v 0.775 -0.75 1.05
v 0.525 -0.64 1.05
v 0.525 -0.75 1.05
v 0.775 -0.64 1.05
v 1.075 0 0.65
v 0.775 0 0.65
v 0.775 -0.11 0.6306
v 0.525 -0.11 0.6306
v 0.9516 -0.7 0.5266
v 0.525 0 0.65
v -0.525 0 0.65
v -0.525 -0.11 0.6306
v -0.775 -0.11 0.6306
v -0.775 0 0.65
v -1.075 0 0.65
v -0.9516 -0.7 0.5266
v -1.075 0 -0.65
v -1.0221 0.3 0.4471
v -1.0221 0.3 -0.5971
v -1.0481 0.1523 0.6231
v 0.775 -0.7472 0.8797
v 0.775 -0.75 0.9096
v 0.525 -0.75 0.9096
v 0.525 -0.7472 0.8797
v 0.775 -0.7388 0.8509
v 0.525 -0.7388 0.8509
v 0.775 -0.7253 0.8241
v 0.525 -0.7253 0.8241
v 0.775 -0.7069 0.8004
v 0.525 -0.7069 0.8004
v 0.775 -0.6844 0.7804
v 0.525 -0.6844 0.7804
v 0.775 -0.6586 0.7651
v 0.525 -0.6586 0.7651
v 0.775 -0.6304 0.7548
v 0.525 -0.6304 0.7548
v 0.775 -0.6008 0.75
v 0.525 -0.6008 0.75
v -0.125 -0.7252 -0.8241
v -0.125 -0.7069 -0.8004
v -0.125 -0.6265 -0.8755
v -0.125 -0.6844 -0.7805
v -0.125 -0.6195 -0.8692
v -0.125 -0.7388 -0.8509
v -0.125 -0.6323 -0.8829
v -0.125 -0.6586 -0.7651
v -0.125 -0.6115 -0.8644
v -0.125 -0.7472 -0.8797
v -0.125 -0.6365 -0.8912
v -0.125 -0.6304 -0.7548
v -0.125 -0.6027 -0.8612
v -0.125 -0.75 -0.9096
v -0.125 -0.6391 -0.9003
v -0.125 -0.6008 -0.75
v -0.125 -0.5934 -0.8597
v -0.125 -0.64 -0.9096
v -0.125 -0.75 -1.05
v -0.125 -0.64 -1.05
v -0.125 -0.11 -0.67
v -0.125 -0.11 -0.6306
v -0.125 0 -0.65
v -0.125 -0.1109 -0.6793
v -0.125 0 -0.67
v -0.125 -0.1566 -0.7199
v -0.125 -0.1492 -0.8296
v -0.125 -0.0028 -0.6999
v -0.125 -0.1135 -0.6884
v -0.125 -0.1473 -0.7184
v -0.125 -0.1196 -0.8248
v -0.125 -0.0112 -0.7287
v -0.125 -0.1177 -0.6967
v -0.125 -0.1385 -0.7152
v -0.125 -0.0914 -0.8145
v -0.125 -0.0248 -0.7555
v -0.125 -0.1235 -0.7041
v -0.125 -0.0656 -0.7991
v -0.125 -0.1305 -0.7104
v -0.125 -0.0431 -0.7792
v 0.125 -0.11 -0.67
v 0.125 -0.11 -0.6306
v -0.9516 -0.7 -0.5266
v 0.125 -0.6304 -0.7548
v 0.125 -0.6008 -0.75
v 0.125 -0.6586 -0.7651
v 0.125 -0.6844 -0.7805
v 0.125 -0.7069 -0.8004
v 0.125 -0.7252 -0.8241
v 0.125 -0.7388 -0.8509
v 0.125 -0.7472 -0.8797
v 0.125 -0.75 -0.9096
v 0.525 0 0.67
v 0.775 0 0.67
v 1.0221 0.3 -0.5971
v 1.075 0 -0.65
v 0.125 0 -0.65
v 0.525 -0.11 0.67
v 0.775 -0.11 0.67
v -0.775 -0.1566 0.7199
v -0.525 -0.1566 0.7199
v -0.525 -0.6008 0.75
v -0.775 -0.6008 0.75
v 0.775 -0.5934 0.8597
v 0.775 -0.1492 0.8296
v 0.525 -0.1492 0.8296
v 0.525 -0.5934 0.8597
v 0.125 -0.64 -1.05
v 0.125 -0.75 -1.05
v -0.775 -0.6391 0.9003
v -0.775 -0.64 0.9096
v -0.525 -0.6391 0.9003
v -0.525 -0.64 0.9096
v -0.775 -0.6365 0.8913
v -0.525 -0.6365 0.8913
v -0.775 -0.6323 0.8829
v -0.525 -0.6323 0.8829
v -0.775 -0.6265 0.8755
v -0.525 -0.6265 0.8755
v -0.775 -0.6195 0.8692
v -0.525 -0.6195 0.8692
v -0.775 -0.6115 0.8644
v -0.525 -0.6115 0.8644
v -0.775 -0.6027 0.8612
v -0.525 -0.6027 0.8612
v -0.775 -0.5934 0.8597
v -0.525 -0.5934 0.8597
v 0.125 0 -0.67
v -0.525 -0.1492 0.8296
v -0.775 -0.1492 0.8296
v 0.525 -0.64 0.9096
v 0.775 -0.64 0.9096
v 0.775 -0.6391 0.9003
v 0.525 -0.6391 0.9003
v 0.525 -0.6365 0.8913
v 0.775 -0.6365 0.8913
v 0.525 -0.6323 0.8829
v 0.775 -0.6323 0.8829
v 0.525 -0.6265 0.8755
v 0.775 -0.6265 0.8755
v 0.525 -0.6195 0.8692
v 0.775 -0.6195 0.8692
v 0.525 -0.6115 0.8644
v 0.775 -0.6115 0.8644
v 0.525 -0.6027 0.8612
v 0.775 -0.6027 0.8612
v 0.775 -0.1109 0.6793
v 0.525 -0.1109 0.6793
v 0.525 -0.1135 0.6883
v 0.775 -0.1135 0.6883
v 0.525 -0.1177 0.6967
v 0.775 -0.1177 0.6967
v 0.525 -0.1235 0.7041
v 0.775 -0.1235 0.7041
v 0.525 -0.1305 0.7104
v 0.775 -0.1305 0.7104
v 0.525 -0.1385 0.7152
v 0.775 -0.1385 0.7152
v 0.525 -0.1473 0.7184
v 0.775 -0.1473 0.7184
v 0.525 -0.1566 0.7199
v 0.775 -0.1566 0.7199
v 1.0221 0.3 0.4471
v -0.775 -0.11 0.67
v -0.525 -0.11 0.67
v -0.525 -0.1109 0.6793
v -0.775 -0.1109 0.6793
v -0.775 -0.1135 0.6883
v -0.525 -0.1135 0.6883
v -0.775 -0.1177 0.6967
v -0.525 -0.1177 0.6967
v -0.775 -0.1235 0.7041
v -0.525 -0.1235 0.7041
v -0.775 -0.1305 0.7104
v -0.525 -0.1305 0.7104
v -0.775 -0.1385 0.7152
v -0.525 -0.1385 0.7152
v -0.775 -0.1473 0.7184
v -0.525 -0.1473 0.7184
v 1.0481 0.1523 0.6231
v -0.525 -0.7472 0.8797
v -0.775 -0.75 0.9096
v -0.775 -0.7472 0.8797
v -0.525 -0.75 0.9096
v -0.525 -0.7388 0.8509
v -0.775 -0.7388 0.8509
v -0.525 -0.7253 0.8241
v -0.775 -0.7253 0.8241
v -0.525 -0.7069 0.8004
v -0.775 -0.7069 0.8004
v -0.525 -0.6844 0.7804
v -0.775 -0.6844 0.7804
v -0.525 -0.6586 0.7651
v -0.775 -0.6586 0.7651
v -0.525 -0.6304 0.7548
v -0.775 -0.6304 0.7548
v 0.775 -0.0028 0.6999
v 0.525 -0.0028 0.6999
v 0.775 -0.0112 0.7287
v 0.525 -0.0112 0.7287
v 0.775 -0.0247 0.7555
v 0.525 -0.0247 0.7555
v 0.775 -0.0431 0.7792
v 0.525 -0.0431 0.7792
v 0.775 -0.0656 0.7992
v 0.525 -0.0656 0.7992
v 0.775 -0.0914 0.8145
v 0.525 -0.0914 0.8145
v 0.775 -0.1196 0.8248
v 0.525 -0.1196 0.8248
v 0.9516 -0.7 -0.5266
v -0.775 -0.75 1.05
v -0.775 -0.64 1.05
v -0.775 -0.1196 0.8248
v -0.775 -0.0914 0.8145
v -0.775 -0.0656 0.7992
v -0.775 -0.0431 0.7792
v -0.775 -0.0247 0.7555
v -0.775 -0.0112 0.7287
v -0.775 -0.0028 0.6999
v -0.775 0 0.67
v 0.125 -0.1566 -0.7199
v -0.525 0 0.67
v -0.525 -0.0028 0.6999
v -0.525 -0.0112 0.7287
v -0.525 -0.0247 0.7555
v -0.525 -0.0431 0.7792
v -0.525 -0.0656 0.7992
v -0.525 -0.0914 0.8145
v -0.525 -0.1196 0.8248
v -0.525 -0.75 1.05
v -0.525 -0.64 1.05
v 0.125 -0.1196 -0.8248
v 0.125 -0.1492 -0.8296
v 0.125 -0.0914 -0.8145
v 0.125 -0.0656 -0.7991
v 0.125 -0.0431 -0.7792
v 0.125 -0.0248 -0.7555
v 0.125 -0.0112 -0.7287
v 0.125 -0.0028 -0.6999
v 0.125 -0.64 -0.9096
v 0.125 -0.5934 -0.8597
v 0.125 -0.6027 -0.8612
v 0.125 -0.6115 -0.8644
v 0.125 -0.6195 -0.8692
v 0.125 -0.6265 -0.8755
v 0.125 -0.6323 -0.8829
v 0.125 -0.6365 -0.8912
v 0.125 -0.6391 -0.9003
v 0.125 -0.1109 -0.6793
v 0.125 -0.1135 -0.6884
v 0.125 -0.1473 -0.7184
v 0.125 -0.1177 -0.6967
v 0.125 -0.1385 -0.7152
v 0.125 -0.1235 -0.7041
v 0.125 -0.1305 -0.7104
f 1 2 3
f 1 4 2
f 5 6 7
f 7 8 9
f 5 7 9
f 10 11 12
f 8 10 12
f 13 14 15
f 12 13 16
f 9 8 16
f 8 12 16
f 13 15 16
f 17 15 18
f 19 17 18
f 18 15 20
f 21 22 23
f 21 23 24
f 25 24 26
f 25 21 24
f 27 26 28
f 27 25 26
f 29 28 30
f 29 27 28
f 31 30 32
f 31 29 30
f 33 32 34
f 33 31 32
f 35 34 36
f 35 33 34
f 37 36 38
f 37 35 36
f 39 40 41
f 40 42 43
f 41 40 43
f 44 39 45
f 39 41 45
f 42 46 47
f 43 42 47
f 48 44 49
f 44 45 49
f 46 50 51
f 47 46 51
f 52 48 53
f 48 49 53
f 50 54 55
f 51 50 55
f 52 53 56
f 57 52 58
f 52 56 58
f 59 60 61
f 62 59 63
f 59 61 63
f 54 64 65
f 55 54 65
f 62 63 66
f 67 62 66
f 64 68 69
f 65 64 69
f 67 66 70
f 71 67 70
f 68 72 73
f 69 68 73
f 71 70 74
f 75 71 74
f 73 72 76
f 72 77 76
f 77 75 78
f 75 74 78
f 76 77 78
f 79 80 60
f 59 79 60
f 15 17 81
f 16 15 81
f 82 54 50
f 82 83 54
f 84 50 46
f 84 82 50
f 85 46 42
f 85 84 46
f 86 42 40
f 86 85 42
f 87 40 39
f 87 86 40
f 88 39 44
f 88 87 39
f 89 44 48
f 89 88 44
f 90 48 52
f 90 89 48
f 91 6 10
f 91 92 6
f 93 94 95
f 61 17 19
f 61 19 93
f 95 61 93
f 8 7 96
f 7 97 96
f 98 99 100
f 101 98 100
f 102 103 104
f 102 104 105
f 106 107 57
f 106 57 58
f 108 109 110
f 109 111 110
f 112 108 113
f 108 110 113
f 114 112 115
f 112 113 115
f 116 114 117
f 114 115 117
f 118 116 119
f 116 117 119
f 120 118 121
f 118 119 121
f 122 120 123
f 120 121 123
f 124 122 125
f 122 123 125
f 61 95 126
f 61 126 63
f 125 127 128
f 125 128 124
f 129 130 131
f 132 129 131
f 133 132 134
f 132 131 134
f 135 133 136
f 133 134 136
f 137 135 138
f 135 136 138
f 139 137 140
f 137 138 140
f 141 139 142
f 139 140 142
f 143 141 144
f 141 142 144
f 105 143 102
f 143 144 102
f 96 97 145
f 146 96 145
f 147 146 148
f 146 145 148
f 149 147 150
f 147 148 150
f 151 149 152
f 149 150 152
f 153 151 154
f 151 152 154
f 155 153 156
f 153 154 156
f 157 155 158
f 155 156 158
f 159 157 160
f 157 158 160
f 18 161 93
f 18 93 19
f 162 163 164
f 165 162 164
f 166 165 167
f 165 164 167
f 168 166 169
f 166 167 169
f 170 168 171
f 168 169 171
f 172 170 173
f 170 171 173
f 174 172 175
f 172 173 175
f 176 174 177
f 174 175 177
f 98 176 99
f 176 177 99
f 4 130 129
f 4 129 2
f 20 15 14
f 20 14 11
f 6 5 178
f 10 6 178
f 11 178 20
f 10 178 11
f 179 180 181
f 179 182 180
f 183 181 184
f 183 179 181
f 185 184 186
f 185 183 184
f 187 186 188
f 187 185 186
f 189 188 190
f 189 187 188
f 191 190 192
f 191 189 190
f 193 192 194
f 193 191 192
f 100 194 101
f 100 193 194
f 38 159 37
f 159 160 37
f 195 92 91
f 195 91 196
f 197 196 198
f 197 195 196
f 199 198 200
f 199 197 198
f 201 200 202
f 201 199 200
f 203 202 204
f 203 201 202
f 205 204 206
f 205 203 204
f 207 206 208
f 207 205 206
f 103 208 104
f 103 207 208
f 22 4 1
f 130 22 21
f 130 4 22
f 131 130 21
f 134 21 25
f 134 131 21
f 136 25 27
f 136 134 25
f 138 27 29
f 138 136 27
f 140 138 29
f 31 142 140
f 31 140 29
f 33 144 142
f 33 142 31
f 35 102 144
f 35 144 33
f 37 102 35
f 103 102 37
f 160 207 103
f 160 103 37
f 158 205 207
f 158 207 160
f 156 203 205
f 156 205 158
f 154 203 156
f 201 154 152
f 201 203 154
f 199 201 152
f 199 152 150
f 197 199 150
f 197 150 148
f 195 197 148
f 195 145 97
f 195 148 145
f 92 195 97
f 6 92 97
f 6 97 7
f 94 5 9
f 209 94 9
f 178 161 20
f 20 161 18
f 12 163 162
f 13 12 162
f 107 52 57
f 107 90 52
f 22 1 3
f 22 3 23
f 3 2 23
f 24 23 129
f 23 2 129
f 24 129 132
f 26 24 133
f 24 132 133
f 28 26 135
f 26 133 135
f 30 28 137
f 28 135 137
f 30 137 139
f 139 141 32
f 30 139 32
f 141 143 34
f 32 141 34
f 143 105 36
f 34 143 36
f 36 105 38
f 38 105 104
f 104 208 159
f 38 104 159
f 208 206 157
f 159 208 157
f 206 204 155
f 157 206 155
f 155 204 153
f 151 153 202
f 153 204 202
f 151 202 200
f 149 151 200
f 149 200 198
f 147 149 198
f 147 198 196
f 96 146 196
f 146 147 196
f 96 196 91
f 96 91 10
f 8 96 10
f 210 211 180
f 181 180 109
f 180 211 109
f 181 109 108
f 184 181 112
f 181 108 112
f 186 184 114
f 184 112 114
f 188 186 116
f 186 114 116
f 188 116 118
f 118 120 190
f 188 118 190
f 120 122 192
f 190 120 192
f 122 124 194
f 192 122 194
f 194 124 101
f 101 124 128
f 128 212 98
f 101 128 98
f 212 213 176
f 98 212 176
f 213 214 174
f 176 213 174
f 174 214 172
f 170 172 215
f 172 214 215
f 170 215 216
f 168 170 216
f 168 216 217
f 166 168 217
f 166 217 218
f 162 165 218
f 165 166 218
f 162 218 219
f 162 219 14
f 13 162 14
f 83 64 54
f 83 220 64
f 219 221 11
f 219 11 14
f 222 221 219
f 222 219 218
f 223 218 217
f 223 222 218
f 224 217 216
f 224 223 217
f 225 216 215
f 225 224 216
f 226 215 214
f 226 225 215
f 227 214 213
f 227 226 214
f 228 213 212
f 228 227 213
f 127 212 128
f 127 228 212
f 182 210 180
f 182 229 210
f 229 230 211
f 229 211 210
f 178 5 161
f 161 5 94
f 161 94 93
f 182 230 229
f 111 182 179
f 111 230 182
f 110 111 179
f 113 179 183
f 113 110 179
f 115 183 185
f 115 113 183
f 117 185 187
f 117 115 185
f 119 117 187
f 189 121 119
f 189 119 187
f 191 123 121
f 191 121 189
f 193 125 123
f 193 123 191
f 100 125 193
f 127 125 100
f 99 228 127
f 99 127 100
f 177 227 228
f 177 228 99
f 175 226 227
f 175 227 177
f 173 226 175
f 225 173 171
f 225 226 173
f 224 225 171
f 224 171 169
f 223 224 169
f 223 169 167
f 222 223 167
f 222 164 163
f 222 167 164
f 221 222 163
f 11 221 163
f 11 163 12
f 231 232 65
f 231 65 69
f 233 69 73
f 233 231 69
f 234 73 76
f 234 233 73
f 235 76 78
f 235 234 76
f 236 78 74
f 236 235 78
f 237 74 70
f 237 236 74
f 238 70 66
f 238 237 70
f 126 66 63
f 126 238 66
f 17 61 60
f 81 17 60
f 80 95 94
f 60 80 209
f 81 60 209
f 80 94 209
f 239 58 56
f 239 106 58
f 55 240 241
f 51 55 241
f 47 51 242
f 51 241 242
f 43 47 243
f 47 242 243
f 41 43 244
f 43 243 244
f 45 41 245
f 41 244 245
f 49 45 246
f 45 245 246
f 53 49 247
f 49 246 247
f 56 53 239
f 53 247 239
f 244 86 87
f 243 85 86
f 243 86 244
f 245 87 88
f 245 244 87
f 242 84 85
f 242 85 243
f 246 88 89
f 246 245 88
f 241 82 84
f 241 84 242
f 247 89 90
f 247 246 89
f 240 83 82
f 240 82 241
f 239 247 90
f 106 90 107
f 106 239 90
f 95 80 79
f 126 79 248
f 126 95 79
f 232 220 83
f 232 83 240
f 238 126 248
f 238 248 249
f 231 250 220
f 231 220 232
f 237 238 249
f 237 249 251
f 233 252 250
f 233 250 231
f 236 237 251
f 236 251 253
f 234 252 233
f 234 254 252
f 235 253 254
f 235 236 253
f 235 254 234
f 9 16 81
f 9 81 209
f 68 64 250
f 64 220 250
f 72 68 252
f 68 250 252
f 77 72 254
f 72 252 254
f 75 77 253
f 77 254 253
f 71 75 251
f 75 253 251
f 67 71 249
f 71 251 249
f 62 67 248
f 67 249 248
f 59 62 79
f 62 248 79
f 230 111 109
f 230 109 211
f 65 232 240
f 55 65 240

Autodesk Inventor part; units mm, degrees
ref_plane "YZ Plane" through (0, 0, 0) normal (1, 0, 0) x (0, 1, 0)
ref_plane "XZ Plane" through (0, 0, 0) normal (0, 1, 0) x (-1, 0, 0)
ref_plane "XY Plane" through (0, 0, 0) normal (0, 0, 1) x (1, 0, 0)
sketch "Sketch1" plane through (0, 0, 0) normal (0, 1, 0) x (-1, 0, 0)
  line L0 (-1.075, 0.65) -> (1.075, 0.65)
  line L1 (1.075, 0.65) -> (1.075, -0.65)
  line L2 (1.075, -0.65) -> (-1.075, -0.65)
  line L3 (-1.075, -0.65) -> (-1.075, 0.65)
  line L4 (-1.075, 0.65) -> (1.075, -0.65) construction
  line L5 (1.075, 0.65) -> (-1.075, -0.65) construction
  point P0 (0, 0)
  dimension "d0" = 2.15
  dimension "d1" = 1.3
extrude "Extrusion1" add sketch "Sketch1" along normal blind 0.3 draft -10
sketch "Sketch2" plane through (0, 0, 0) normal (0, -1, 0) x (1, 0, 0)
  line L0 (1.075, 0.65) -> (-1.075, 0.65) projected
  line L1 (-1.075, 0.65) -> (-1.075, -0.65) projected
  line L2 (-1.075, -0.65) -> (1.075, -0.65) projected
  line L3 (1.075, -0.65) -> (1.075, 0.65) projected
  point P0 (0, 0)
extrude "Extrusion2" add sketch "Sketch2" along normal blind 0.7 draft -10
sketch "Sketch3" plane through (0, 0, 0) normal (0, 1, 0) x (-1, 0, 0)
  line L0 (-1.075, 0.65) -> (1.075, 0.65) projected
  line L1 (1.075, 0.65) -> (1.075, -0.65) projected
  line L2 (1.075, -0.65) -> (-1.075, -0.65) projected
  line L3 (-1.075, -0.65) -> (-1.075, 0.65) projected
  line L4 (-0.775, 0.65) -> (-0.525, 0.65)
  line L5 (-0.525, 0.65) -> (-0.525, 0.67)
  line L6 (-0.525, 0.67) -> (-0.775, 0.67)
  line L7 (-0.775, 0.67) -> (-0.775, 0.65)
  line L8 (-0.125, -0.65) -> (0.125, -0.65)
  line L9 (0.125, -0.65) -> (0.125, -0.67)
  line L10 (0.125, -0.67) -> (-0.125, -0.67)
  line L11 (-0.125, -0.67) -> (-0.125, -0.65)
  line L12 (-0.525, 0.65) -> (-0.775, 0.65)
  line L13 (-0.775, 0.65) -> (-0.775, 0)
  line L14 (-0.775, 0) -> (-0.525, 0)
  line L15 (-0.525, 0) -> (-0.525, 0.65)
  line L16 (-0.125, -0.65) -> (0.125, -0.65)
  line L17 (0.125, -0.65) -> (0.125, 0)
  line L18 (0.125, 0) -> (-0.125, 0)
  line L19 (-0.125, 0) -> (-0.125, -0.65)
  point P0 (0, 0)
  point P1 (0, -0.67)
  point P2 (-0.65, 0.67)
  point P3 (0, 0)
  dimension "d6" = 0.25
  dimension "d7" = 0.02
  dimension "d8" = 0.65
  dimension "d9" = 0
extrude "Extrusion3" add sketch "Sketch3" against normal blind 0.11 contours L7 L6 L5 L0 | L0 L15 L14 L13
sketch "Sketch4" plane through (0.775, 0, 0.67) normal (1, 0, 0) x (0, 0, -1)
  line L0 (0.02, 0) -> (0.0394, -0.11) projected
  line L1 (0, 0) -> (0.02, 0) projected
  line L2 (0, 0) -> (0, -0.11) projected
  line L3 (0.0394, -0.11) -> (0, -0.11) projected
  line L4 (0, -0.11) -> (0.0394, -0.11) projected
  arc A0 (0, -0.11) -> (-0.0499, -0.1566) centre (0, -0.16) ccw
  arc A1 (0, 0) -> (-0.1596, -0.1492) centre (0, -0.16) ccw
  arc A2 (-0.2396, -0.64) -> (-0.1897, -0.5934) centre (-0.2396, -0.59) ccw
  arc A3 (-0.2396, -0.75) -> (-0.08, -0.6008) centre (-0.2396, -0.59) ccw
  line L5 (-0.0499, -0.1566) -> (-0.08, -0.6008)
  line L6 (-0.1596, -0.1492) -> (-0.1897, -0.5934)
  line L7 (-0.2396, -0.64) -> (-0.38, -0.64)
  line L8 (-0.38, -0.64) -> (-0.38, -0.75)
  line L9 (-0.38, -0.75) -> (-0.2396, -0.75)
  line L10 (0.0394, -0.11) -> (0, -0.11) projected
  line L11 (0, 0) -> (0.02, 0) projected
  line L12 (0, 0) -> (0, -0.11) projected
  line L13 (1.1966, -0.7) -> (0.1434, -0.7) projected
  point P0 (0.67, 0)
  dimension "d12" = 1.05
  dimension "d13" = 0.05
  dimension "d14" = 0.05
  dimension "d15" = 0.3
extrude "Extrusion4" add sketch "Sketch4" against normal up to surface (0.25 mm away) contours L2 A0 L5 A3 L9 L8 L7 A2 L6 A1
extrude "Extrusion5" add sketch "Sketch3" against normal blind 0.11 contours L19 L18 L17 L2 | L2 L9 L10 L11
sketch "Sketch5" plane through (0.125, 0, -0.65) normal (1, 0, 0) x (0, 0, -1)
  line L0 (-1.3, 0) -> (-1.2806, -0.11) projected
  line L1 (-1.32, 0) -> (-1.3, 0) projected
  arc A0 (-1.32, 0) -> (-1.4796, -0.1492) centre (-1.32, -0.16) ccw projected
  line L2 (-1.4796, -0.1492) -> (-1.5097, -0.5934) projected
  arc A1 (-1.5596, -0.64) -> (-1.5097, -0.5934) centre (-1.5596, -0.59) ccw projected
  line L3 (-1.5596, -0.64) -> (-1.7, -0.64) projected
  line L4 (-1.7, -0.64) -> (-1.7, -0.75) projected
  line L5 (-1.7, -0.75) -> (-1.5596, -0.75) projected
  arc A2 (-1.5596, -0.75) -> (-1.4, -0.6008) centre (-1.5596, -0.59) ccw projected
  line L6 (-1.4, -0.6008) -> (-1.3699, -0.1566) projected
  arc A3 (-1.32, -0.11) -> (-1.3699, -0.1566) centre (-1.32, -0.16) ccw projected
  line L7 (-1.2806, -0.11) -> (-1.32, -0.11) projected
  line L8 (-0.0194, -0.11) -> (0, 0) projected
  line L9 (0.02, -0.11) -> (-0.0194, -0.11) projected
  line L10 (0.02, 0) -> (0.02, -0.11) projected
  line L11 (0, 0) -> (0.02, 0) projected
  arc A4 (0.0699, -0.1566) -> (0.02, -0.11) centre (0.02, -0.16) ccw
  line L12 (0.02, 0) -> (0, 0) projected
  arc A5 (0.1796, -0.1492) -> (0.02, 0) centre (0.02, -0.16) ccw
  arc A6 (0.2097, -0.5934) -> (0.2596, -0.64) centre (0.2596, -0.59) ccw
  arc A7 (0.1, -0.6008) -> (0.2596, -0.75) centre (0.2596, -0.59) ccw
  line L13 (0.2596, -0.75) -> (0.4, -0.75)
  line L14 (0.4, -0.75) -> (0.4, -0.64)
  line L15 (0.4, -0.64) -> (0.2596, -0.64)
  line L16 (0.1796, -0.1492) -> (0.2097, -0.5934)
  line L17 (0.0699, -0.1566) -> (0.1, -0.6008)
  point P0 (-0.65, 0)
extrude "Extrusion6" add sketch "Sketch5" against normal up to surface (0.25 mm away) contours L10 A5 L16 A6 L15 L14 L13 A7 L17 A4
pattern_linear "Rectangular Pattern1" count 2 spacing 1.3 along (-1, 0, 0) of "Extrusion3", "Extrusion4"
chamfer "Chamfer1" distance 0.15 angle 45 1 edges at (0, 0.3, 0.5971)
properties part number "Semiconductor_SOT323" material "ABS Plastic"
